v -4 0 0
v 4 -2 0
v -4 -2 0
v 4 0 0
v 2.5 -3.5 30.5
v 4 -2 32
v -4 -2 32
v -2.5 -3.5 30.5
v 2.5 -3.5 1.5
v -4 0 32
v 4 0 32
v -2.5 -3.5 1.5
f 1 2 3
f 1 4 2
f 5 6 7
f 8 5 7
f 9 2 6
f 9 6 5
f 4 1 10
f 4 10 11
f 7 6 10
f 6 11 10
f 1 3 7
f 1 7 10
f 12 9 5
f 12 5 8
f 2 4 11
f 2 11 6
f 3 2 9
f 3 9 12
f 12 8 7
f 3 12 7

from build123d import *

# Parameters (mm, degrees)
BOSS_EXTRU_1_DEPTH = 32
CHANFREIN1_SIZE    = 1.5


with BuildPart() as part:
    # Esquisse1 → Boss.-Extru.1 (new body)
    with BuildSketch(Plane.XY):
        Polygon((-4, 0), (4, 0), (4, -2), (2.5, -3.5), (-2.5, -3.5), (-4, -2), align=None)
    extrude(amount=BOSS_EXTRU_1_DEPTH)

    # Chanfrein1
    chanfrein1_edges = [part.edges().sort_by_distance(p)[0] for p in [
        (0, -3.5, 0),
        (0, -3.5, 32),
    ]]
    chamfer(chanfrein1_edges, length=CHANFREIN1_SIZE)


solid = part.part
